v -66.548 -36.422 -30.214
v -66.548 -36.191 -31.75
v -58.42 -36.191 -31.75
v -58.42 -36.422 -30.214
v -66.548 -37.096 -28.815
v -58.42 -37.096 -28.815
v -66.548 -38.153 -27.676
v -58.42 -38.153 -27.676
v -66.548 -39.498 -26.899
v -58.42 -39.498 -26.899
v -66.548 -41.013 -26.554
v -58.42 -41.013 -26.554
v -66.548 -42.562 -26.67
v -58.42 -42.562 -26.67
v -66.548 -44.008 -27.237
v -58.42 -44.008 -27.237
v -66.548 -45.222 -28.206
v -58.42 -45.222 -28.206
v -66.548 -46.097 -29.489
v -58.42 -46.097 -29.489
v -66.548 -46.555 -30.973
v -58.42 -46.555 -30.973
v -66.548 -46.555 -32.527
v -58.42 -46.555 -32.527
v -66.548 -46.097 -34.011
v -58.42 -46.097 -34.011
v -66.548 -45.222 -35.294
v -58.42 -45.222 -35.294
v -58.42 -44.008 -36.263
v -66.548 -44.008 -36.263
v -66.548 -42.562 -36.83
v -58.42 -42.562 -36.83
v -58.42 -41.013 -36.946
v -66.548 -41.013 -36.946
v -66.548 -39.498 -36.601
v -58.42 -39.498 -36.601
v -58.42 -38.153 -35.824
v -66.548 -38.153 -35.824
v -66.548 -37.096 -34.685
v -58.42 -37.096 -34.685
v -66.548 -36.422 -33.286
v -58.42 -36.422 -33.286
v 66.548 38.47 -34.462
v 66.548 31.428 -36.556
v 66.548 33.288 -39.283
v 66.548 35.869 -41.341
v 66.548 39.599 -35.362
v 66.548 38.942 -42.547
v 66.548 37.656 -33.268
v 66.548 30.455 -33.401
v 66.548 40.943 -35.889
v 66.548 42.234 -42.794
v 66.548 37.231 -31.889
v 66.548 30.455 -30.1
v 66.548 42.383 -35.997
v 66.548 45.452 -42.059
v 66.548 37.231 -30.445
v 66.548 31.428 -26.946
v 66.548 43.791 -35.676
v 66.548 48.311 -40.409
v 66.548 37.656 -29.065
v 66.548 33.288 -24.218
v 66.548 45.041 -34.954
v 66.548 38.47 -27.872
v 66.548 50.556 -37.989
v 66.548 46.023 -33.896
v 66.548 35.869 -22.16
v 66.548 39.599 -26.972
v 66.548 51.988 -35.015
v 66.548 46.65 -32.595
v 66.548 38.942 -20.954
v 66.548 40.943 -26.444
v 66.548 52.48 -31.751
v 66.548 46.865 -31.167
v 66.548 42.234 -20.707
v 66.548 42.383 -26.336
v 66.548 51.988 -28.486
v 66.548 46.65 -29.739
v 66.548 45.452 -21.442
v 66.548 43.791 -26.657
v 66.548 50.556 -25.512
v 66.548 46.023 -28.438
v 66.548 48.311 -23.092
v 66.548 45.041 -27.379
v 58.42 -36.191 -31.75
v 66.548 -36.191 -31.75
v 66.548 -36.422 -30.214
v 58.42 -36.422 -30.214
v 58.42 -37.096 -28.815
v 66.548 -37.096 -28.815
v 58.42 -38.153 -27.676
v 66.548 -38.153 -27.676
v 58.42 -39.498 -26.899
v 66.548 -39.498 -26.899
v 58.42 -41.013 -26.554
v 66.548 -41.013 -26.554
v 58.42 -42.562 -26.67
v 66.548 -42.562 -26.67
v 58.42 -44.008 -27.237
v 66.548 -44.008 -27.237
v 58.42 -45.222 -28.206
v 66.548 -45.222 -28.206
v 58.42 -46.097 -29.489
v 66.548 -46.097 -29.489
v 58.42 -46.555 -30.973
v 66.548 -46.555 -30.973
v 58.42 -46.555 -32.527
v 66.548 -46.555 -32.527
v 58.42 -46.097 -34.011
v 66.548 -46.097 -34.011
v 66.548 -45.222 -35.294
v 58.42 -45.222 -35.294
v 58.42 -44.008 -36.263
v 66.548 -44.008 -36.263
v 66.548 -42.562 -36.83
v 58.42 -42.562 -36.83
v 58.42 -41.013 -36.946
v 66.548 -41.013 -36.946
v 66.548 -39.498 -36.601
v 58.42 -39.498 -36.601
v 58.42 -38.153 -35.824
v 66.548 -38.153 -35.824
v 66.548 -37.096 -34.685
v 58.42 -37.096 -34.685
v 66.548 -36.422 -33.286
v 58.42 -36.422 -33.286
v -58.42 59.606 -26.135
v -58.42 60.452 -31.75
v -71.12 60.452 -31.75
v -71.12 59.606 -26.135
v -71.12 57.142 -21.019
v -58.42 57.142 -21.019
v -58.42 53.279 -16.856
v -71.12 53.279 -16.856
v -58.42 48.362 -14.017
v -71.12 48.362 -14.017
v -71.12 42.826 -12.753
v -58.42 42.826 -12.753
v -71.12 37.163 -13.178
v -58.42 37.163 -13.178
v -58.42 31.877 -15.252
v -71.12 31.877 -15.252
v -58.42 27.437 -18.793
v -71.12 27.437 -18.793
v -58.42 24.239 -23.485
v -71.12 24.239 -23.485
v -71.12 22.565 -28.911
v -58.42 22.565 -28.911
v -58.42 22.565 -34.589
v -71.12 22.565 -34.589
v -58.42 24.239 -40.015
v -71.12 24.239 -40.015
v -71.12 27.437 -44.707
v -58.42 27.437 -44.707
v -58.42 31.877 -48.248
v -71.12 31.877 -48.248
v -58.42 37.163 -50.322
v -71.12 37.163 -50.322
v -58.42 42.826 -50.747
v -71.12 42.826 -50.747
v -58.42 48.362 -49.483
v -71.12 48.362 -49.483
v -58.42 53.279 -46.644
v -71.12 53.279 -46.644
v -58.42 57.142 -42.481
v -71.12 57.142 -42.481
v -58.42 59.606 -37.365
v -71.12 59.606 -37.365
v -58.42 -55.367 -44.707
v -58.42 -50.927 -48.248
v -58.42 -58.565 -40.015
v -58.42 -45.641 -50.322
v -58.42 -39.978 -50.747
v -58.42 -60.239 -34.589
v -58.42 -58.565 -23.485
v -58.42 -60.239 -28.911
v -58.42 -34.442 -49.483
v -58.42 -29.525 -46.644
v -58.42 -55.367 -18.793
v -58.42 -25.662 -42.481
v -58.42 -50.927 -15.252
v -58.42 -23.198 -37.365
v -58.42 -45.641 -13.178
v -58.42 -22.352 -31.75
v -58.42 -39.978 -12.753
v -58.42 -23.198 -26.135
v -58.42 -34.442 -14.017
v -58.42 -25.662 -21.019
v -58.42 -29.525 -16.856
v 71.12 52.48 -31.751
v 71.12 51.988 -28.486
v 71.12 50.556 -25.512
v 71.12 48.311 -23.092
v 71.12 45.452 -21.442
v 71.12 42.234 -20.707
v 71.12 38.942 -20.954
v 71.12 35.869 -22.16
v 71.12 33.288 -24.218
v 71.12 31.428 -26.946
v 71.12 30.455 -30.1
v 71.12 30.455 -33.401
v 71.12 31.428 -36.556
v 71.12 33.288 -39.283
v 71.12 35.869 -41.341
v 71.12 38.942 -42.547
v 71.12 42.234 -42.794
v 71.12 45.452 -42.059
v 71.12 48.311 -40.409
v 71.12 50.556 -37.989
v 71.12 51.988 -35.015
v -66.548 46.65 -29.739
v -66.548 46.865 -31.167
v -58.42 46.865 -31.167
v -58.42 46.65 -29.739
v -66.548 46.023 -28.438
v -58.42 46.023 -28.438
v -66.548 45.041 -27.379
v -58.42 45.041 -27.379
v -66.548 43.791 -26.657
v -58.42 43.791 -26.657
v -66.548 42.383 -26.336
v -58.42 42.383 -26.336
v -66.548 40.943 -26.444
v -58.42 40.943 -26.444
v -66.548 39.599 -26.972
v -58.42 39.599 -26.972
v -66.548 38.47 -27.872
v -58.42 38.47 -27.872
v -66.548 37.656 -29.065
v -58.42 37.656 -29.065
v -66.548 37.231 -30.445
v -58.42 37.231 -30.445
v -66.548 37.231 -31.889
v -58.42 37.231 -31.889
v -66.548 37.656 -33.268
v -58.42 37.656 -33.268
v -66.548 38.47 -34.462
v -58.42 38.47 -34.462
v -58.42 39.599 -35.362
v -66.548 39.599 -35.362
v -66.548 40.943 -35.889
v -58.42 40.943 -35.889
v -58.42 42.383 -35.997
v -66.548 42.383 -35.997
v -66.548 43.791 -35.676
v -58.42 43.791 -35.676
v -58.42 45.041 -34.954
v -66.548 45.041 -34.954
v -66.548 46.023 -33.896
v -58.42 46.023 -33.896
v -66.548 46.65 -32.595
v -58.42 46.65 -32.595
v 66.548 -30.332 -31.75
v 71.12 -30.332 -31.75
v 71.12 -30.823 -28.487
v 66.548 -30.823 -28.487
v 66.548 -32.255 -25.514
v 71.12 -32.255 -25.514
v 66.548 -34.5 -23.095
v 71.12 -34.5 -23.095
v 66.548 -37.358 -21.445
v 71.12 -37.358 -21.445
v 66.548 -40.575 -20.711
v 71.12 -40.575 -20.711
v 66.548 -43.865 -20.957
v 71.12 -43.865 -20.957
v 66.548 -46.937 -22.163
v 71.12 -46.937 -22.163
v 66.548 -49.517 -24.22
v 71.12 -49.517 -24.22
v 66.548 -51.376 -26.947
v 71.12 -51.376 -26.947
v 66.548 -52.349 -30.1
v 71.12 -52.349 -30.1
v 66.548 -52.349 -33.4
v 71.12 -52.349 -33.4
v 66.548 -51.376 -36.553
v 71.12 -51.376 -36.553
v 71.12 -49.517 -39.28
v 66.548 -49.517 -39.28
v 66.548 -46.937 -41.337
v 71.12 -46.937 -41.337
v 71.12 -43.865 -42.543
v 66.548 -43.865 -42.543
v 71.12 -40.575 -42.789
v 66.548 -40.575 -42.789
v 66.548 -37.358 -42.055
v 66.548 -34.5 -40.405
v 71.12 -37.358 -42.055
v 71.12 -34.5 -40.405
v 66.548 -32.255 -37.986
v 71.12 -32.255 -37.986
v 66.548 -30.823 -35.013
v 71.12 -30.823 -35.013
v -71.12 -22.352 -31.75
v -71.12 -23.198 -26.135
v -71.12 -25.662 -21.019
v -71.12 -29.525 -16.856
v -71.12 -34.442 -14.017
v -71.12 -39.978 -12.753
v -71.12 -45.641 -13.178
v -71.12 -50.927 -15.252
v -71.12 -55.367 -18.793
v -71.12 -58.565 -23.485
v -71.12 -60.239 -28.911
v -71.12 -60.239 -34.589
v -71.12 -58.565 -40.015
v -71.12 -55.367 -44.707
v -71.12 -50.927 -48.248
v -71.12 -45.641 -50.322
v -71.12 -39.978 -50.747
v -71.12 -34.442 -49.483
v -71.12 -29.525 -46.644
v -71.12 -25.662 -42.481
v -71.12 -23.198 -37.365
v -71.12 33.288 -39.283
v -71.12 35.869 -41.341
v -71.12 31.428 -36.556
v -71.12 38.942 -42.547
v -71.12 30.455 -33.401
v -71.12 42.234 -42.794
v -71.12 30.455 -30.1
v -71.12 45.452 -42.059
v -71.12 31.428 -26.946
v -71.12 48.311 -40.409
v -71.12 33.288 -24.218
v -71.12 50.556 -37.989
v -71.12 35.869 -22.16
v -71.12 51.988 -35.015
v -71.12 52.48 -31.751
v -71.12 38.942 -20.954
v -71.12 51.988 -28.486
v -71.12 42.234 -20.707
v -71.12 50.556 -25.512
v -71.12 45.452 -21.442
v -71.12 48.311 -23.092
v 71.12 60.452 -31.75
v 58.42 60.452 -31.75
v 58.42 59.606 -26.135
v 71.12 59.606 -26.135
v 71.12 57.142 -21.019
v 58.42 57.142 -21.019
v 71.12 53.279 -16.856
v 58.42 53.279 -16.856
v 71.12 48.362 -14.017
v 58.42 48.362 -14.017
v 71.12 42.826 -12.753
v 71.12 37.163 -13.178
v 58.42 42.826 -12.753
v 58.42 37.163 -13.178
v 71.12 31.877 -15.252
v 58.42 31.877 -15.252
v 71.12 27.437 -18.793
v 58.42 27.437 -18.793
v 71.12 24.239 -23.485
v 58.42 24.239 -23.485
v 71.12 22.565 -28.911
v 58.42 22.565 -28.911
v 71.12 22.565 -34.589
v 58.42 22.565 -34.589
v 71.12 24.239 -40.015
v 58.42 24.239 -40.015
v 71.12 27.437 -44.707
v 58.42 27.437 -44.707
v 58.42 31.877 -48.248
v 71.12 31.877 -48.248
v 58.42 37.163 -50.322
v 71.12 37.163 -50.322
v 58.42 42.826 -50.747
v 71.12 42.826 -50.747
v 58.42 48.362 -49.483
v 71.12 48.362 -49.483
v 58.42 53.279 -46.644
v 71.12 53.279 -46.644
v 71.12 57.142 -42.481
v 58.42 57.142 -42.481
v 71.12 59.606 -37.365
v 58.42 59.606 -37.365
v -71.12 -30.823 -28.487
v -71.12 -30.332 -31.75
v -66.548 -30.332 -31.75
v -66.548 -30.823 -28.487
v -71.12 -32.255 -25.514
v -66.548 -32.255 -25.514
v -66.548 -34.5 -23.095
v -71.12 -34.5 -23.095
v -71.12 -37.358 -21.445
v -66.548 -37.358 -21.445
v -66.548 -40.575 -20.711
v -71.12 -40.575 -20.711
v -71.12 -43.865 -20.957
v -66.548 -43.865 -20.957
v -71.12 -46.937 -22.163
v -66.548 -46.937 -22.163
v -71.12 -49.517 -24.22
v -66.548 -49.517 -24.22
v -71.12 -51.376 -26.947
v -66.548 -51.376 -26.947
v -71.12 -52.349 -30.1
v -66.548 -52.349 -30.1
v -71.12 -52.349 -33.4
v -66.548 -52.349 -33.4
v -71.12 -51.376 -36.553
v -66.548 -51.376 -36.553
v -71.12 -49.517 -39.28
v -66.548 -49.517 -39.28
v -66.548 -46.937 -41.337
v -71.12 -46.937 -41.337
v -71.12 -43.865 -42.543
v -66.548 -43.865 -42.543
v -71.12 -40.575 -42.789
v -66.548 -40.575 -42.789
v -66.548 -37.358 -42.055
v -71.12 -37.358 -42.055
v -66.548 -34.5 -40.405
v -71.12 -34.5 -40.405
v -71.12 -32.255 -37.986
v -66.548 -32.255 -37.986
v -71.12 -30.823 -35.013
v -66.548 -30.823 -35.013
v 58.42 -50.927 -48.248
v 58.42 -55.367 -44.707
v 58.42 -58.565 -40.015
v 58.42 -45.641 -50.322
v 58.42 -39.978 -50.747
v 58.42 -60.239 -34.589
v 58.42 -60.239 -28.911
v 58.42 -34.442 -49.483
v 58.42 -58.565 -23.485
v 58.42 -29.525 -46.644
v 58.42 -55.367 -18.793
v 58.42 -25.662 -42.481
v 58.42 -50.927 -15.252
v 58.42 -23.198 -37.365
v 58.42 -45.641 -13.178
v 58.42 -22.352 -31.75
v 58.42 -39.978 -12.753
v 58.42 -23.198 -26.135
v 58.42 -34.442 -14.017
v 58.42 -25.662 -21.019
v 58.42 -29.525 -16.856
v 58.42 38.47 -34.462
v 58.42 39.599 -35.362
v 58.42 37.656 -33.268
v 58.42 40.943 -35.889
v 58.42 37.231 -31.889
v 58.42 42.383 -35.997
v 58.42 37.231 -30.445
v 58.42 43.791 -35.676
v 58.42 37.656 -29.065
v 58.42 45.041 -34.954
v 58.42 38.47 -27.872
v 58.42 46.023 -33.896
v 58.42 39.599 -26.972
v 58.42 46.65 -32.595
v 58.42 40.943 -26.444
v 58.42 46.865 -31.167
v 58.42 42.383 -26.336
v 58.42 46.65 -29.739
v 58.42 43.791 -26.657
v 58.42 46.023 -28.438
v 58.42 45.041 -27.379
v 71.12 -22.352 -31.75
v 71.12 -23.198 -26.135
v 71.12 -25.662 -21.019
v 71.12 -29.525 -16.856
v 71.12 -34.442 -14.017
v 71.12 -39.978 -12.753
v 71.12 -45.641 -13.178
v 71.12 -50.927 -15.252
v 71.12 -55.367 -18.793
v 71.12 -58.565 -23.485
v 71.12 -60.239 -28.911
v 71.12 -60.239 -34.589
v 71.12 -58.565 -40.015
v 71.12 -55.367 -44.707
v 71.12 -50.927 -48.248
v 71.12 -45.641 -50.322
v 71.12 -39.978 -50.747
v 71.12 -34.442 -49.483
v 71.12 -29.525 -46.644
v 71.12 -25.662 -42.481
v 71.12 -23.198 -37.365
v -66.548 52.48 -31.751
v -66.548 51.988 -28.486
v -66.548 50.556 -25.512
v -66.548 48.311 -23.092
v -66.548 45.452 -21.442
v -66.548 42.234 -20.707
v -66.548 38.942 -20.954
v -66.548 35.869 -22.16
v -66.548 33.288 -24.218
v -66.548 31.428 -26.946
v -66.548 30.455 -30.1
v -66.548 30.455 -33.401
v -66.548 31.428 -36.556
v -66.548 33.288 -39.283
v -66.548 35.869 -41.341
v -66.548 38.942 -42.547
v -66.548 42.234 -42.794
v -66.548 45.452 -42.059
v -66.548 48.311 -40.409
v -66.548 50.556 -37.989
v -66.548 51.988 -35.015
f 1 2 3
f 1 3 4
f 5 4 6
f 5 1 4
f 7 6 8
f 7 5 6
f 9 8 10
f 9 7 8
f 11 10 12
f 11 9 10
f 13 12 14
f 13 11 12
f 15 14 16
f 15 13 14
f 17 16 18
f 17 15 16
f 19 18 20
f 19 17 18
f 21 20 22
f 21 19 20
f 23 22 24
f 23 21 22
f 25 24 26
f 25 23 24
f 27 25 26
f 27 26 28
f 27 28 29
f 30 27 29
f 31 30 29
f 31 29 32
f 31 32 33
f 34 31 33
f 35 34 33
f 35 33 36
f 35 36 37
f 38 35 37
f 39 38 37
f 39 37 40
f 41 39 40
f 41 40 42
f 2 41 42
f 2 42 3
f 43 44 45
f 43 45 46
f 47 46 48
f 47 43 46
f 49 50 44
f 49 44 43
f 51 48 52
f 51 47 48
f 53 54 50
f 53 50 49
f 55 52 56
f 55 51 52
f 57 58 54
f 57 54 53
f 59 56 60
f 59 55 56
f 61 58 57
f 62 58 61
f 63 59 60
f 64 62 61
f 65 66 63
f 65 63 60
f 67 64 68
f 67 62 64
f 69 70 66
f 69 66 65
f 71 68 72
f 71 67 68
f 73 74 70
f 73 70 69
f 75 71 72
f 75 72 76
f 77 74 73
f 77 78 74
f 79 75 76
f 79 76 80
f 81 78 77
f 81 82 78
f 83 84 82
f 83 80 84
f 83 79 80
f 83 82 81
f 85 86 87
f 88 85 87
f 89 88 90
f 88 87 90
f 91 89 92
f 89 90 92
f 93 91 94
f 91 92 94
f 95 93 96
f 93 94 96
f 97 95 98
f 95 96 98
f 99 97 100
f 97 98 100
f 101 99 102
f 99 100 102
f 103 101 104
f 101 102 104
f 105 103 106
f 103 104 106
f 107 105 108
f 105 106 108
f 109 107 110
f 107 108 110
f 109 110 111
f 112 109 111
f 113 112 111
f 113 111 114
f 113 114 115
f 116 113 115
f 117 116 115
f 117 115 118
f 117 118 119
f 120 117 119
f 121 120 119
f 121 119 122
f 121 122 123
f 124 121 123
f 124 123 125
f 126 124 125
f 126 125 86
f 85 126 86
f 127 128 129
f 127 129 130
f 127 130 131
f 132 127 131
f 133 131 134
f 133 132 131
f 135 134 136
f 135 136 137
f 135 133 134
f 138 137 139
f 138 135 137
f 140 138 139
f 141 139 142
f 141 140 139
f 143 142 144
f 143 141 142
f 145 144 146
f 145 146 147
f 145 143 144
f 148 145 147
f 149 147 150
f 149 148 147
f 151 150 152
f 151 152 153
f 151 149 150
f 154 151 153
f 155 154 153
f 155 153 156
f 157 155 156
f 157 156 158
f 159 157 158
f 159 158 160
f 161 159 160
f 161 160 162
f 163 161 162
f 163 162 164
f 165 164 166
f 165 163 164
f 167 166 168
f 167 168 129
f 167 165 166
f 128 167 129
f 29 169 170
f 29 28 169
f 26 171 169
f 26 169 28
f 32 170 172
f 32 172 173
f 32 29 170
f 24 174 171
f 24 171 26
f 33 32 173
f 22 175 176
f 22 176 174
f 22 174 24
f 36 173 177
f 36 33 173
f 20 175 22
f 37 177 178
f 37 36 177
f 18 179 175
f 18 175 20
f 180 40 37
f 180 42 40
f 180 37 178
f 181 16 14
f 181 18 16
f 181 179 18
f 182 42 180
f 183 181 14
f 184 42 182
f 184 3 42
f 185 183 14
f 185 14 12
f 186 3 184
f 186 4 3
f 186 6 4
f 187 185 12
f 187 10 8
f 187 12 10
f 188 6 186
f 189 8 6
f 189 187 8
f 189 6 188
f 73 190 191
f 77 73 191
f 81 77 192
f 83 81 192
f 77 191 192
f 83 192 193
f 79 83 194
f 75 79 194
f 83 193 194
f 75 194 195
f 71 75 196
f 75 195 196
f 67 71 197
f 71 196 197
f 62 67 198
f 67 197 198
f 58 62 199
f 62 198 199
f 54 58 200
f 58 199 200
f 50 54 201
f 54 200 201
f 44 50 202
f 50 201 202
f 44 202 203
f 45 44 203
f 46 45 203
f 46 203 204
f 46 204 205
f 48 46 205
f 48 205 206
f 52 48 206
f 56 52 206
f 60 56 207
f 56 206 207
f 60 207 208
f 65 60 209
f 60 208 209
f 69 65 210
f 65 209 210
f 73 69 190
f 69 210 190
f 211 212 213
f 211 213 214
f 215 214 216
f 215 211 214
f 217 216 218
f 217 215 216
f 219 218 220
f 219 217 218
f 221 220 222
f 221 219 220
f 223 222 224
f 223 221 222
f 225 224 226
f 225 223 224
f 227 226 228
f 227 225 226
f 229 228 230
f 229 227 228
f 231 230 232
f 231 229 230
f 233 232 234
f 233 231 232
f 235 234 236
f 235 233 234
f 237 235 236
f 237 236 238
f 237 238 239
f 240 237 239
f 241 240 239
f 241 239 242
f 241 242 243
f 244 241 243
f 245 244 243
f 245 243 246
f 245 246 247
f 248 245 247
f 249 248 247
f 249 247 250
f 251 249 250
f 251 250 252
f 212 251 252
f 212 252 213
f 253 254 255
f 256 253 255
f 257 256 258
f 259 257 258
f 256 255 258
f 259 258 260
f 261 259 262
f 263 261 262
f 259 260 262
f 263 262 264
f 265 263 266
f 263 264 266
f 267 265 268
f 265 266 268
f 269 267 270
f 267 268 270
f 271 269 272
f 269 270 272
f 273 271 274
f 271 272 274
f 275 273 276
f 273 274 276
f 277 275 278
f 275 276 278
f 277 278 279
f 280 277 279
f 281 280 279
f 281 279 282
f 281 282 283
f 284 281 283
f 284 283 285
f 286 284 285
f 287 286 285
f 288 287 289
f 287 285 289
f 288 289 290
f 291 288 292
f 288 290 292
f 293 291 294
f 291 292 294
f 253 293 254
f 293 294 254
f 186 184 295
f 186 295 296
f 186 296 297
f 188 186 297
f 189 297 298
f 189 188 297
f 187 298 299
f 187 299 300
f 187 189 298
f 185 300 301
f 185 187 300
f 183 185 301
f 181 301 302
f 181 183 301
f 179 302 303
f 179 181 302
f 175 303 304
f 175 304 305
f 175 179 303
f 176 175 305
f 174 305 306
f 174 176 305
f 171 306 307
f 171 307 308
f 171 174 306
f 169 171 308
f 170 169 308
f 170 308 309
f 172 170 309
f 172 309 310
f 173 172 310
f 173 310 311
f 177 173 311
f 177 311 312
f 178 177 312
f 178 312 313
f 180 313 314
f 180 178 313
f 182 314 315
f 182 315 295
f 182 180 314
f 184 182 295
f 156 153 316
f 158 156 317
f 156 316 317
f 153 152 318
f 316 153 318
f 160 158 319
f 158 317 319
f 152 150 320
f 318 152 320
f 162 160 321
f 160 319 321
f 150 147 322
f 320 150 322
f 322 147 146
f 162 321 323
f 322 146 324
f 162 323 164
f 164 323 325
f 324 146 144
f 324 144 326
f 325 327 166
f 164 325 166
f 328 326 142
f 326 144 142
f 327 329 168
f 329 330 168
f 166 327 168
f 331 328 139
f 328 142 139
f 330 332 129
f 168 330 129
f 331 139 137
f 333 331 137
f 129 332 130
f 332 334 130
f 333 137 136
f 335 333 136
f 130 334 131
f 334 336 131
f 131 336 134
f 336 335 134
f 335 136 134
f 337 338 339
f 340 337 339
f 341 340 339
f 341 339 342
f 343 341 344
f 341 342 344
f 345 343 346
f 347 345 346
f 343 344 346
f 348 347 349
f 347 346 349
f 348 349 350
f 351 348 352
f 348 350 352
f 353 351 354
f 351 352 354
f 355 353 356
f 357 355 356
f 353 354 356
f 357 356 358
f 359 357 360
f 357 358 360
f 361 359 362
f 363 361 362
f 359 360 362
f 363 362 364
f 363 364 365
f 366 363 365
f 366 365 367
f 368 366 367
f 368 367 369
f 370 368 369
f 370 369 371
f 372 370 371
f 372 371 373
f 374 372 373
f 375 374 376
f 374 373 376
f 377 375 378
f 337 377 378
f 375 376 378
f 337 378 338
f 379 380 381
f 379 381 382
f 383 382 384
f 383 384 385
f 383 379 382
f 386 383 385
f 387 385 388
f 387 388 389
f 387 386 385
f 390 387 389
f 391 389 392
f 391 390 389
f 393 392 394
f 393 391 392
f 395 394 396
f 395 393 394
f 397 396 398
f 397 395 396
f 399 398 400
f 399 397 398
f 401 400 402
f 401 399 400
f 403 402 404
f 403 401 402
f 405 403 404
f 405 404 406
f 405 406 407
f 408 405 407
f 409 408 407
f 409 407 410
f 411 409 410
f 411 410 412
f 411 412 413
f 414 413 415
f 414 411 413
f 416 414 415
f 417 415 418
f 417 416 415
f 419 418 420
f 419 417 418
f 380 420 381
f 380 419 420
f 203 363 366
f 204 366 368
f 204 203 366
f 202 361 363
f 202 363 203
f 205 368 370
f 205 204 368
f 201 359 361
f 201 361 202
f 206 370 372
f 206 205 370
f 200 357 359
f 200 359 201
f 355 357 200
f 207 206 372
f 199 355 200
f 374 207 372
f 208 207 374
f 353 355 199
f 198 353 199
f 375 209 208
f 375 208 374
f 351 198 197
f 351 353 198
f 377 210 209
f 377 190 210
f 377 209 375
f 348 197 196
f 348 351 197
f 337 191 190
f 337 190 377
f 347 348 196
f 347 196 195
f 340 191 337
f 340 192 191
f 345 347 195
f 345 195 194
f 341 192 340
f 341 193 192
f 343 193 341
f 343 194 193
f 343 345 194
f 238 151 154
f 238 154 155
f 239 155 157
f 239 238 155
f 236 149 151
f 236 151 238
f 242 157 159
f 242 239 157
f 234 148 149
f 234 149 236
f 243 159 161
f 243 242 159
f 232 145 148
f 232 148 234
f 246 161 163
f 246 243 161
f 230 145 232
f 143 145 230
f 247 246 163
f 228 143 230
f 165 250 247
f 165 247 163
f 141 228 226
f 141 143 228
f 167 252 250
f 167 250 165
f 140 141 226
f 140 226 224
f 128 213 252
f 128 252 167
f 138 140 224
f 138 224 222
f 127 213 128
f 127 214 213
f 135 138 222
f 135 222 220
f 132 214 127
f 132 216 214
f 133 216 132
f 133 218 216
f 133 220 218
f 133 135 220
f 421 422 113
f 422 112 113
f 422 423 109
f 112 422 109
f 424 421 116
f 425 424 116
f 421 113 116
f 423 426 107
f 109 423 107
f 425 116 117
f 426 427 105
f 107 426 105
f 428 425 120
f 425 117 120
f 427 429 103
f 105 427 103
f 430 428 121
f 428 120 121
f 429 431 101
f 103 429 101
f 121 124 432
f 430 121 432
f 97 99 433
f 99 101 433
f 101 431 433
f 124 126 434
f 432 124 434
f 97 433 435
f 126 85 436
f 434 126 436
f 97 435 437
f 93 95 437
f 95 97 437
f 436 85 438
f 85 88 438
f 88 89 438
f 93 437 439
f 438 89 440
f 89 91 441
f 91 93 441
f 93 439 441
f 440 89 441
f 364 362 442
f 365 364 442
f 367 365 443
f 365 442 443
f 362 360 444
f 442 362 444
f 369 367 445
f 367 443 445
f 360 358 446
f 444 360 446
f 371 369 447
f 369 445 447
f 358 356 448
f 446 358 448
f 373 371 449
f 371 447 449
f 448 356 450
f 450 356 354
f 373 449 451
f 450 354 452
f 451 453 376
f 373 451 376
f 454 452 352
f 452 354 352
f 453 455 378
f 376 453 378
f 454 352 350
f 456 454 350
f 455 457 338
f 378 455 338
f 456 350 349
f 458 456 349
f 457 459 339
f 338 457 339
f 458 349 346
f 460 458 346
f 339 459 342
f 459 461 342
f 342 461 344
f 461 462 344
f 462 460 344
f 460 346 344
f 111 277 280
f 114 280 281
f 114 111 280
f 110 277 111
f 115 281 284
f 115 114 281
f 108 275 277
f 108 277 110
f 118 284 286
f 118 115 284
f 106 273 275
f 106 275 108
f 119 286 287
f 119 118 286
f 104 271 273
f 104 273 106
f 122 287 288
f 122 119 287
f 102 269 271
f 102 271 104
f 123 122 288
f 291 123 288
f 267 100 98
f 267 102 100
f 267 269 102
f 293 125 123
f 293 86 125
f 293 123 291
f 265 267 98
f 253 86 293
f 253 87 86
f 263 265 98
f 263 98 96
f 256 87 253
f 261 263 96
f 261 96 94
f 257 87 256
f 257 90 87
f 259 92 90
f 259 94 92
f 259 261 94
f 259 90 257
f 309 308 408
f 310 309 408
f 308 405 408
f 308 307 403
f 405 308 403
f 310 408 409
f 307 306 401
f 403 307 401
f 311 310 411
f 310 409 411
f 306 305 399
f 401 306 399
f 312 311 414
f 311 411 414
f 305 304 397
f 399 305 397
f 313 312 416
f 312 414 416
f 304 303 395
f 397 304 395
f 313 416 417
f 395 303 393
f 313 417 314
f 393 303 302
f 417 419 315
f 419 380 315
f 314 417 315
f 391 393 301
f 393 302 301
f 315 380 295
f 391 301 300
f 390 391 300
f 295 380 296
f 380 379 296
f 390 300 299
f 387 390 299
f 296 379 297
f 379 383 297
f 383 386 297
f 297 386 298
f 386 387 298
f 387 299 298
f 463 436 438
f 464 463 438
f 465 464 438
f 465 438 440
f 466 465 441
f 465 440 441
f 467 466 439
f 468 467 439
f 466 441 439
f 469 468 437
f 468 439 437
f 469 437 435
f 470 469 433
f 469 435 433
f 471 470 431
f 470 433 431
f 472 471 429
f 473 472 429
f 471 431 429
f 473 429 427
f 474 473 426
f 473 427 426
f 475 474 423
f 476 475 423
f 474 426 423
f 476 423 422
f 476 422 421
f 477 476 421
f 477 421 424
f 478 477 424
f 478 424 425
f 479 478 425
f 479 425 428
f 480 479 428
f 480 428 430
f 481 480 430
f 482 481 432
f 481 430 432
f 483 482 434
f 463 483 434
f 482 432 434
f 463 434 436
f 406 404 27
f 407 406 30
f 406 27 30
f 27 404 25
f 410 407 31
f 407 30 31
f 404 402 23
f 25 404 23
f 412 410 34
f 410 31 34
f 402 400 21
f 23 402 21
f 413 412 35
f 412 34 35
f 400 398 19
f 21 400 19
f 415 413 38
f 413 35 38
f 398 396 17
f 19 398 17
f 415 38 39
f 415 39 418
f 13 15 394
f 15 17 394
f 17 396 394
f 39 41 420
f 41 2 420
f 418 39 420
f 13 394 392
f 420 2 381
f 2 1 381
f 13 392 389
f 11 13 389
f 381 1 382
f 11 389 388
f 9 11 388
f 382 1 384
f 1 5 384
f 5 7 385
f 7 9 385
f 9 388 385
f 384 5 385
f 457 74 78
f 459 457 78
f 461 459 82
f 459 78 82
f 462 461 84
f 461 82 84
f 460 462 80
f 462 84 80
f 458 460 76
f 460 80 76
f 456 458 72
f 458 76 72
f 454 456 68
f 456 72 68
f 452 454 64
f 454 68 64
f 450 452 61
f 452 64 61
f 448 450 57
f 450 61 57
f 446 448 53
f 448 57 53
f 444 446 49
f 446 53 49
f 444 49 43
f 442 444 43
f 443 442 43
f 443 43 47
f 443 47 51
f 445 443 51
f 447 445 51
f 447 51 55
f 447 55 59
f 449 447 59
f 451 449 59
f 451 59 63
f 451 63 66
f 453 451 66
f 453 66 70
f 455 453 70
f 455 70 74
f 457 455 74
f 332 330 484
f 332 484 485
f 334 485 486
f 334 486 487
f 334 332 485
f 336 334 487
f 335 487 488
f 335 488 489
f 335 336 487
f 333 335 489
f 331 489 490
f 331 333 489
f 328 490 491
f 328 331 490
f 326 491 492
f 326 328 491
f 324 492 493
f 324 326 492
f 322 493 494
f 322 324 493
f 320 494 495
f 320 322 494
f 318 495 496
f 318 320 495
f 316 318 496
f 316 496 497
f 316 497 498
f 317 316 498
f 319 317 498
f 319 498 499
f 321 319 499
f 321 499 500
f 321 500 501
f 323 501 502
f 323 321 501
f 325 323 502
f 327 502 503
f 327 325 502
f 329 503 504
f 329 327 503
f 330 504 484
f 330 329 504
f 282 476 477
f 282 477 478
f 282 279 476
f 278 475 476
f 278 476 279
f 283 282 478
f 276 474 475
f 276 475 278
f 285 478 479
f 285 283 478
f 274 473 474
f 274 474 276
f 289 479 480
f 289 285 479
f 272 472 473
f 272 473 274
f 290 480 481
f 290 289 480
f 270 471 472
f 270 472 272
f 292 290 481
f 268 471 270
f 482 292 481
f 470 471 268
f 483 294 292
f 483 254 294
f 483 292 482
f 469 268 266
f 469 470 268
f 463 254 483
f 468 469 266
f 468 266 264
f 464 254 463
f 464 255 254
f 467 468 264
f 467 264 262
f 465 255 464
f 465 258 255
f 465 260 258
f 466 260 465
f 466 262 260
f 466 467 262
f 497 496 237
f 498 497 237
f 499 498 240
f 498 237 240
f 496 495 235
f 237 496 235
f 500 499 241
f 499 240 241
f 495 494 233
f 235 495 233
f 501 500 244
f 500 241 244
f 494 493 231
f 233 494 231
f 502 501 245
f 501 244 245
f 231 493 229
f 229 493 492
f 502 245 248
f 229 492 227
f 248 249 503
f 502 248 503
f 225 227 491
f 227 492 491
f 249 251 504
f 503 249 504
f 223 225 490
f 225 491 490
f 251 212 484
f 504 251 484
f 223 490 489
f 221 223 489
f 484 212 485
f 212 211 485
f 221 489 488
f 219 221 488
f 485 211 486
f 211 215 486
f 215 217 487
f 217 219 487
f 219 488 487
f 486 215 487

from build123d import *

# Parameters (mm, degrees)
F1_START = 58.42
F0_R     = 19.05
F1_DEPTH = 12.7
F2_R     = 11.0703614
F2_R_2   = 11.0744
F3_DEPTH = 4.572
F4_R     = 5.2110339315
F4_R_2   = 4.844169713
F5_DEPTH = 40.64


with BuildPart() as f1:
    # F0 (on Right) → F1 (new body)
    with BuildSketch(Plane.YZ.offset(F1_START)):
        with Locations((-41.402, -31.75)):
            Circle(F0_R)
    extrude(amount=F1_DEPTH)


with BuildPart() as f1b:
    # F0 (on Right) → F1, piece 2 (new body)
    with BuildSketch(Plane.YZ.offset(F1_START)):
        with Locations((41.402, -31.75)):
            Circle(F0_R)
    extrude(amount=F1_DEPTH)


with BuildPart() as f3_tool:
    # F2 (on face) → F3 (new body)
    with BuildSketch(Plane.YZ.offset(71.12)):
        with Locations((-41.402, -31.75)):
            Circle(F2_R)
        with Locations((41.4059897788, -31.7506260631)):
            Circle(F2_R_2)
    extrude(amount=-F3_DEPTH)


with BuildPart() as f1_1:
    add(f1.part)

    # F3: cut by f3_tool
    add(f3_tool.part, mode=Mode.SUBTRACT)


with BuildPart() as f1b_1:
    add(f1b.part)

    # F3: cut by f3_tool
    add(f3_tool.part, mode=Mode.SUBTRACT)


with BuildPart() as f5_tool:
    # F4 (on face) → F5 (new body)
    with BuildSketch(Plane.YZ.offset(66.548)):
        with Locations((-41.402, -31.75)):
            Circle(F4_R)
        with Locations((42.0207567513, -31.1666876078)):
            Circle(F4_R_2)
    extrude(amount=-F5_DEPTH)


with BuildPart() as f1_2:
    add(f1_1.part)

    # F5: cut by f5_tool
    add(f5_tool.part, mode=Mode.SUBTRACT)


with BuildPart() as f1b_2:
    add(f1b_1.part)

    # F5: cut by f5_tool
    add(f5_tool.part, mode=Mode.SUBTRACT)


with BuildPart() as f6_1:
    # F6: instance of F1
    add(f1_2.part.mirror(Plane.YZ))


with BuildPart() as f6_2:
    # F6: instance of F1b
    add(f1b_2.part.mirror(Plane.YZ))


solid = Compound([f1_2.part, f1b_2.part, f6_1.part, f6_2.part])
